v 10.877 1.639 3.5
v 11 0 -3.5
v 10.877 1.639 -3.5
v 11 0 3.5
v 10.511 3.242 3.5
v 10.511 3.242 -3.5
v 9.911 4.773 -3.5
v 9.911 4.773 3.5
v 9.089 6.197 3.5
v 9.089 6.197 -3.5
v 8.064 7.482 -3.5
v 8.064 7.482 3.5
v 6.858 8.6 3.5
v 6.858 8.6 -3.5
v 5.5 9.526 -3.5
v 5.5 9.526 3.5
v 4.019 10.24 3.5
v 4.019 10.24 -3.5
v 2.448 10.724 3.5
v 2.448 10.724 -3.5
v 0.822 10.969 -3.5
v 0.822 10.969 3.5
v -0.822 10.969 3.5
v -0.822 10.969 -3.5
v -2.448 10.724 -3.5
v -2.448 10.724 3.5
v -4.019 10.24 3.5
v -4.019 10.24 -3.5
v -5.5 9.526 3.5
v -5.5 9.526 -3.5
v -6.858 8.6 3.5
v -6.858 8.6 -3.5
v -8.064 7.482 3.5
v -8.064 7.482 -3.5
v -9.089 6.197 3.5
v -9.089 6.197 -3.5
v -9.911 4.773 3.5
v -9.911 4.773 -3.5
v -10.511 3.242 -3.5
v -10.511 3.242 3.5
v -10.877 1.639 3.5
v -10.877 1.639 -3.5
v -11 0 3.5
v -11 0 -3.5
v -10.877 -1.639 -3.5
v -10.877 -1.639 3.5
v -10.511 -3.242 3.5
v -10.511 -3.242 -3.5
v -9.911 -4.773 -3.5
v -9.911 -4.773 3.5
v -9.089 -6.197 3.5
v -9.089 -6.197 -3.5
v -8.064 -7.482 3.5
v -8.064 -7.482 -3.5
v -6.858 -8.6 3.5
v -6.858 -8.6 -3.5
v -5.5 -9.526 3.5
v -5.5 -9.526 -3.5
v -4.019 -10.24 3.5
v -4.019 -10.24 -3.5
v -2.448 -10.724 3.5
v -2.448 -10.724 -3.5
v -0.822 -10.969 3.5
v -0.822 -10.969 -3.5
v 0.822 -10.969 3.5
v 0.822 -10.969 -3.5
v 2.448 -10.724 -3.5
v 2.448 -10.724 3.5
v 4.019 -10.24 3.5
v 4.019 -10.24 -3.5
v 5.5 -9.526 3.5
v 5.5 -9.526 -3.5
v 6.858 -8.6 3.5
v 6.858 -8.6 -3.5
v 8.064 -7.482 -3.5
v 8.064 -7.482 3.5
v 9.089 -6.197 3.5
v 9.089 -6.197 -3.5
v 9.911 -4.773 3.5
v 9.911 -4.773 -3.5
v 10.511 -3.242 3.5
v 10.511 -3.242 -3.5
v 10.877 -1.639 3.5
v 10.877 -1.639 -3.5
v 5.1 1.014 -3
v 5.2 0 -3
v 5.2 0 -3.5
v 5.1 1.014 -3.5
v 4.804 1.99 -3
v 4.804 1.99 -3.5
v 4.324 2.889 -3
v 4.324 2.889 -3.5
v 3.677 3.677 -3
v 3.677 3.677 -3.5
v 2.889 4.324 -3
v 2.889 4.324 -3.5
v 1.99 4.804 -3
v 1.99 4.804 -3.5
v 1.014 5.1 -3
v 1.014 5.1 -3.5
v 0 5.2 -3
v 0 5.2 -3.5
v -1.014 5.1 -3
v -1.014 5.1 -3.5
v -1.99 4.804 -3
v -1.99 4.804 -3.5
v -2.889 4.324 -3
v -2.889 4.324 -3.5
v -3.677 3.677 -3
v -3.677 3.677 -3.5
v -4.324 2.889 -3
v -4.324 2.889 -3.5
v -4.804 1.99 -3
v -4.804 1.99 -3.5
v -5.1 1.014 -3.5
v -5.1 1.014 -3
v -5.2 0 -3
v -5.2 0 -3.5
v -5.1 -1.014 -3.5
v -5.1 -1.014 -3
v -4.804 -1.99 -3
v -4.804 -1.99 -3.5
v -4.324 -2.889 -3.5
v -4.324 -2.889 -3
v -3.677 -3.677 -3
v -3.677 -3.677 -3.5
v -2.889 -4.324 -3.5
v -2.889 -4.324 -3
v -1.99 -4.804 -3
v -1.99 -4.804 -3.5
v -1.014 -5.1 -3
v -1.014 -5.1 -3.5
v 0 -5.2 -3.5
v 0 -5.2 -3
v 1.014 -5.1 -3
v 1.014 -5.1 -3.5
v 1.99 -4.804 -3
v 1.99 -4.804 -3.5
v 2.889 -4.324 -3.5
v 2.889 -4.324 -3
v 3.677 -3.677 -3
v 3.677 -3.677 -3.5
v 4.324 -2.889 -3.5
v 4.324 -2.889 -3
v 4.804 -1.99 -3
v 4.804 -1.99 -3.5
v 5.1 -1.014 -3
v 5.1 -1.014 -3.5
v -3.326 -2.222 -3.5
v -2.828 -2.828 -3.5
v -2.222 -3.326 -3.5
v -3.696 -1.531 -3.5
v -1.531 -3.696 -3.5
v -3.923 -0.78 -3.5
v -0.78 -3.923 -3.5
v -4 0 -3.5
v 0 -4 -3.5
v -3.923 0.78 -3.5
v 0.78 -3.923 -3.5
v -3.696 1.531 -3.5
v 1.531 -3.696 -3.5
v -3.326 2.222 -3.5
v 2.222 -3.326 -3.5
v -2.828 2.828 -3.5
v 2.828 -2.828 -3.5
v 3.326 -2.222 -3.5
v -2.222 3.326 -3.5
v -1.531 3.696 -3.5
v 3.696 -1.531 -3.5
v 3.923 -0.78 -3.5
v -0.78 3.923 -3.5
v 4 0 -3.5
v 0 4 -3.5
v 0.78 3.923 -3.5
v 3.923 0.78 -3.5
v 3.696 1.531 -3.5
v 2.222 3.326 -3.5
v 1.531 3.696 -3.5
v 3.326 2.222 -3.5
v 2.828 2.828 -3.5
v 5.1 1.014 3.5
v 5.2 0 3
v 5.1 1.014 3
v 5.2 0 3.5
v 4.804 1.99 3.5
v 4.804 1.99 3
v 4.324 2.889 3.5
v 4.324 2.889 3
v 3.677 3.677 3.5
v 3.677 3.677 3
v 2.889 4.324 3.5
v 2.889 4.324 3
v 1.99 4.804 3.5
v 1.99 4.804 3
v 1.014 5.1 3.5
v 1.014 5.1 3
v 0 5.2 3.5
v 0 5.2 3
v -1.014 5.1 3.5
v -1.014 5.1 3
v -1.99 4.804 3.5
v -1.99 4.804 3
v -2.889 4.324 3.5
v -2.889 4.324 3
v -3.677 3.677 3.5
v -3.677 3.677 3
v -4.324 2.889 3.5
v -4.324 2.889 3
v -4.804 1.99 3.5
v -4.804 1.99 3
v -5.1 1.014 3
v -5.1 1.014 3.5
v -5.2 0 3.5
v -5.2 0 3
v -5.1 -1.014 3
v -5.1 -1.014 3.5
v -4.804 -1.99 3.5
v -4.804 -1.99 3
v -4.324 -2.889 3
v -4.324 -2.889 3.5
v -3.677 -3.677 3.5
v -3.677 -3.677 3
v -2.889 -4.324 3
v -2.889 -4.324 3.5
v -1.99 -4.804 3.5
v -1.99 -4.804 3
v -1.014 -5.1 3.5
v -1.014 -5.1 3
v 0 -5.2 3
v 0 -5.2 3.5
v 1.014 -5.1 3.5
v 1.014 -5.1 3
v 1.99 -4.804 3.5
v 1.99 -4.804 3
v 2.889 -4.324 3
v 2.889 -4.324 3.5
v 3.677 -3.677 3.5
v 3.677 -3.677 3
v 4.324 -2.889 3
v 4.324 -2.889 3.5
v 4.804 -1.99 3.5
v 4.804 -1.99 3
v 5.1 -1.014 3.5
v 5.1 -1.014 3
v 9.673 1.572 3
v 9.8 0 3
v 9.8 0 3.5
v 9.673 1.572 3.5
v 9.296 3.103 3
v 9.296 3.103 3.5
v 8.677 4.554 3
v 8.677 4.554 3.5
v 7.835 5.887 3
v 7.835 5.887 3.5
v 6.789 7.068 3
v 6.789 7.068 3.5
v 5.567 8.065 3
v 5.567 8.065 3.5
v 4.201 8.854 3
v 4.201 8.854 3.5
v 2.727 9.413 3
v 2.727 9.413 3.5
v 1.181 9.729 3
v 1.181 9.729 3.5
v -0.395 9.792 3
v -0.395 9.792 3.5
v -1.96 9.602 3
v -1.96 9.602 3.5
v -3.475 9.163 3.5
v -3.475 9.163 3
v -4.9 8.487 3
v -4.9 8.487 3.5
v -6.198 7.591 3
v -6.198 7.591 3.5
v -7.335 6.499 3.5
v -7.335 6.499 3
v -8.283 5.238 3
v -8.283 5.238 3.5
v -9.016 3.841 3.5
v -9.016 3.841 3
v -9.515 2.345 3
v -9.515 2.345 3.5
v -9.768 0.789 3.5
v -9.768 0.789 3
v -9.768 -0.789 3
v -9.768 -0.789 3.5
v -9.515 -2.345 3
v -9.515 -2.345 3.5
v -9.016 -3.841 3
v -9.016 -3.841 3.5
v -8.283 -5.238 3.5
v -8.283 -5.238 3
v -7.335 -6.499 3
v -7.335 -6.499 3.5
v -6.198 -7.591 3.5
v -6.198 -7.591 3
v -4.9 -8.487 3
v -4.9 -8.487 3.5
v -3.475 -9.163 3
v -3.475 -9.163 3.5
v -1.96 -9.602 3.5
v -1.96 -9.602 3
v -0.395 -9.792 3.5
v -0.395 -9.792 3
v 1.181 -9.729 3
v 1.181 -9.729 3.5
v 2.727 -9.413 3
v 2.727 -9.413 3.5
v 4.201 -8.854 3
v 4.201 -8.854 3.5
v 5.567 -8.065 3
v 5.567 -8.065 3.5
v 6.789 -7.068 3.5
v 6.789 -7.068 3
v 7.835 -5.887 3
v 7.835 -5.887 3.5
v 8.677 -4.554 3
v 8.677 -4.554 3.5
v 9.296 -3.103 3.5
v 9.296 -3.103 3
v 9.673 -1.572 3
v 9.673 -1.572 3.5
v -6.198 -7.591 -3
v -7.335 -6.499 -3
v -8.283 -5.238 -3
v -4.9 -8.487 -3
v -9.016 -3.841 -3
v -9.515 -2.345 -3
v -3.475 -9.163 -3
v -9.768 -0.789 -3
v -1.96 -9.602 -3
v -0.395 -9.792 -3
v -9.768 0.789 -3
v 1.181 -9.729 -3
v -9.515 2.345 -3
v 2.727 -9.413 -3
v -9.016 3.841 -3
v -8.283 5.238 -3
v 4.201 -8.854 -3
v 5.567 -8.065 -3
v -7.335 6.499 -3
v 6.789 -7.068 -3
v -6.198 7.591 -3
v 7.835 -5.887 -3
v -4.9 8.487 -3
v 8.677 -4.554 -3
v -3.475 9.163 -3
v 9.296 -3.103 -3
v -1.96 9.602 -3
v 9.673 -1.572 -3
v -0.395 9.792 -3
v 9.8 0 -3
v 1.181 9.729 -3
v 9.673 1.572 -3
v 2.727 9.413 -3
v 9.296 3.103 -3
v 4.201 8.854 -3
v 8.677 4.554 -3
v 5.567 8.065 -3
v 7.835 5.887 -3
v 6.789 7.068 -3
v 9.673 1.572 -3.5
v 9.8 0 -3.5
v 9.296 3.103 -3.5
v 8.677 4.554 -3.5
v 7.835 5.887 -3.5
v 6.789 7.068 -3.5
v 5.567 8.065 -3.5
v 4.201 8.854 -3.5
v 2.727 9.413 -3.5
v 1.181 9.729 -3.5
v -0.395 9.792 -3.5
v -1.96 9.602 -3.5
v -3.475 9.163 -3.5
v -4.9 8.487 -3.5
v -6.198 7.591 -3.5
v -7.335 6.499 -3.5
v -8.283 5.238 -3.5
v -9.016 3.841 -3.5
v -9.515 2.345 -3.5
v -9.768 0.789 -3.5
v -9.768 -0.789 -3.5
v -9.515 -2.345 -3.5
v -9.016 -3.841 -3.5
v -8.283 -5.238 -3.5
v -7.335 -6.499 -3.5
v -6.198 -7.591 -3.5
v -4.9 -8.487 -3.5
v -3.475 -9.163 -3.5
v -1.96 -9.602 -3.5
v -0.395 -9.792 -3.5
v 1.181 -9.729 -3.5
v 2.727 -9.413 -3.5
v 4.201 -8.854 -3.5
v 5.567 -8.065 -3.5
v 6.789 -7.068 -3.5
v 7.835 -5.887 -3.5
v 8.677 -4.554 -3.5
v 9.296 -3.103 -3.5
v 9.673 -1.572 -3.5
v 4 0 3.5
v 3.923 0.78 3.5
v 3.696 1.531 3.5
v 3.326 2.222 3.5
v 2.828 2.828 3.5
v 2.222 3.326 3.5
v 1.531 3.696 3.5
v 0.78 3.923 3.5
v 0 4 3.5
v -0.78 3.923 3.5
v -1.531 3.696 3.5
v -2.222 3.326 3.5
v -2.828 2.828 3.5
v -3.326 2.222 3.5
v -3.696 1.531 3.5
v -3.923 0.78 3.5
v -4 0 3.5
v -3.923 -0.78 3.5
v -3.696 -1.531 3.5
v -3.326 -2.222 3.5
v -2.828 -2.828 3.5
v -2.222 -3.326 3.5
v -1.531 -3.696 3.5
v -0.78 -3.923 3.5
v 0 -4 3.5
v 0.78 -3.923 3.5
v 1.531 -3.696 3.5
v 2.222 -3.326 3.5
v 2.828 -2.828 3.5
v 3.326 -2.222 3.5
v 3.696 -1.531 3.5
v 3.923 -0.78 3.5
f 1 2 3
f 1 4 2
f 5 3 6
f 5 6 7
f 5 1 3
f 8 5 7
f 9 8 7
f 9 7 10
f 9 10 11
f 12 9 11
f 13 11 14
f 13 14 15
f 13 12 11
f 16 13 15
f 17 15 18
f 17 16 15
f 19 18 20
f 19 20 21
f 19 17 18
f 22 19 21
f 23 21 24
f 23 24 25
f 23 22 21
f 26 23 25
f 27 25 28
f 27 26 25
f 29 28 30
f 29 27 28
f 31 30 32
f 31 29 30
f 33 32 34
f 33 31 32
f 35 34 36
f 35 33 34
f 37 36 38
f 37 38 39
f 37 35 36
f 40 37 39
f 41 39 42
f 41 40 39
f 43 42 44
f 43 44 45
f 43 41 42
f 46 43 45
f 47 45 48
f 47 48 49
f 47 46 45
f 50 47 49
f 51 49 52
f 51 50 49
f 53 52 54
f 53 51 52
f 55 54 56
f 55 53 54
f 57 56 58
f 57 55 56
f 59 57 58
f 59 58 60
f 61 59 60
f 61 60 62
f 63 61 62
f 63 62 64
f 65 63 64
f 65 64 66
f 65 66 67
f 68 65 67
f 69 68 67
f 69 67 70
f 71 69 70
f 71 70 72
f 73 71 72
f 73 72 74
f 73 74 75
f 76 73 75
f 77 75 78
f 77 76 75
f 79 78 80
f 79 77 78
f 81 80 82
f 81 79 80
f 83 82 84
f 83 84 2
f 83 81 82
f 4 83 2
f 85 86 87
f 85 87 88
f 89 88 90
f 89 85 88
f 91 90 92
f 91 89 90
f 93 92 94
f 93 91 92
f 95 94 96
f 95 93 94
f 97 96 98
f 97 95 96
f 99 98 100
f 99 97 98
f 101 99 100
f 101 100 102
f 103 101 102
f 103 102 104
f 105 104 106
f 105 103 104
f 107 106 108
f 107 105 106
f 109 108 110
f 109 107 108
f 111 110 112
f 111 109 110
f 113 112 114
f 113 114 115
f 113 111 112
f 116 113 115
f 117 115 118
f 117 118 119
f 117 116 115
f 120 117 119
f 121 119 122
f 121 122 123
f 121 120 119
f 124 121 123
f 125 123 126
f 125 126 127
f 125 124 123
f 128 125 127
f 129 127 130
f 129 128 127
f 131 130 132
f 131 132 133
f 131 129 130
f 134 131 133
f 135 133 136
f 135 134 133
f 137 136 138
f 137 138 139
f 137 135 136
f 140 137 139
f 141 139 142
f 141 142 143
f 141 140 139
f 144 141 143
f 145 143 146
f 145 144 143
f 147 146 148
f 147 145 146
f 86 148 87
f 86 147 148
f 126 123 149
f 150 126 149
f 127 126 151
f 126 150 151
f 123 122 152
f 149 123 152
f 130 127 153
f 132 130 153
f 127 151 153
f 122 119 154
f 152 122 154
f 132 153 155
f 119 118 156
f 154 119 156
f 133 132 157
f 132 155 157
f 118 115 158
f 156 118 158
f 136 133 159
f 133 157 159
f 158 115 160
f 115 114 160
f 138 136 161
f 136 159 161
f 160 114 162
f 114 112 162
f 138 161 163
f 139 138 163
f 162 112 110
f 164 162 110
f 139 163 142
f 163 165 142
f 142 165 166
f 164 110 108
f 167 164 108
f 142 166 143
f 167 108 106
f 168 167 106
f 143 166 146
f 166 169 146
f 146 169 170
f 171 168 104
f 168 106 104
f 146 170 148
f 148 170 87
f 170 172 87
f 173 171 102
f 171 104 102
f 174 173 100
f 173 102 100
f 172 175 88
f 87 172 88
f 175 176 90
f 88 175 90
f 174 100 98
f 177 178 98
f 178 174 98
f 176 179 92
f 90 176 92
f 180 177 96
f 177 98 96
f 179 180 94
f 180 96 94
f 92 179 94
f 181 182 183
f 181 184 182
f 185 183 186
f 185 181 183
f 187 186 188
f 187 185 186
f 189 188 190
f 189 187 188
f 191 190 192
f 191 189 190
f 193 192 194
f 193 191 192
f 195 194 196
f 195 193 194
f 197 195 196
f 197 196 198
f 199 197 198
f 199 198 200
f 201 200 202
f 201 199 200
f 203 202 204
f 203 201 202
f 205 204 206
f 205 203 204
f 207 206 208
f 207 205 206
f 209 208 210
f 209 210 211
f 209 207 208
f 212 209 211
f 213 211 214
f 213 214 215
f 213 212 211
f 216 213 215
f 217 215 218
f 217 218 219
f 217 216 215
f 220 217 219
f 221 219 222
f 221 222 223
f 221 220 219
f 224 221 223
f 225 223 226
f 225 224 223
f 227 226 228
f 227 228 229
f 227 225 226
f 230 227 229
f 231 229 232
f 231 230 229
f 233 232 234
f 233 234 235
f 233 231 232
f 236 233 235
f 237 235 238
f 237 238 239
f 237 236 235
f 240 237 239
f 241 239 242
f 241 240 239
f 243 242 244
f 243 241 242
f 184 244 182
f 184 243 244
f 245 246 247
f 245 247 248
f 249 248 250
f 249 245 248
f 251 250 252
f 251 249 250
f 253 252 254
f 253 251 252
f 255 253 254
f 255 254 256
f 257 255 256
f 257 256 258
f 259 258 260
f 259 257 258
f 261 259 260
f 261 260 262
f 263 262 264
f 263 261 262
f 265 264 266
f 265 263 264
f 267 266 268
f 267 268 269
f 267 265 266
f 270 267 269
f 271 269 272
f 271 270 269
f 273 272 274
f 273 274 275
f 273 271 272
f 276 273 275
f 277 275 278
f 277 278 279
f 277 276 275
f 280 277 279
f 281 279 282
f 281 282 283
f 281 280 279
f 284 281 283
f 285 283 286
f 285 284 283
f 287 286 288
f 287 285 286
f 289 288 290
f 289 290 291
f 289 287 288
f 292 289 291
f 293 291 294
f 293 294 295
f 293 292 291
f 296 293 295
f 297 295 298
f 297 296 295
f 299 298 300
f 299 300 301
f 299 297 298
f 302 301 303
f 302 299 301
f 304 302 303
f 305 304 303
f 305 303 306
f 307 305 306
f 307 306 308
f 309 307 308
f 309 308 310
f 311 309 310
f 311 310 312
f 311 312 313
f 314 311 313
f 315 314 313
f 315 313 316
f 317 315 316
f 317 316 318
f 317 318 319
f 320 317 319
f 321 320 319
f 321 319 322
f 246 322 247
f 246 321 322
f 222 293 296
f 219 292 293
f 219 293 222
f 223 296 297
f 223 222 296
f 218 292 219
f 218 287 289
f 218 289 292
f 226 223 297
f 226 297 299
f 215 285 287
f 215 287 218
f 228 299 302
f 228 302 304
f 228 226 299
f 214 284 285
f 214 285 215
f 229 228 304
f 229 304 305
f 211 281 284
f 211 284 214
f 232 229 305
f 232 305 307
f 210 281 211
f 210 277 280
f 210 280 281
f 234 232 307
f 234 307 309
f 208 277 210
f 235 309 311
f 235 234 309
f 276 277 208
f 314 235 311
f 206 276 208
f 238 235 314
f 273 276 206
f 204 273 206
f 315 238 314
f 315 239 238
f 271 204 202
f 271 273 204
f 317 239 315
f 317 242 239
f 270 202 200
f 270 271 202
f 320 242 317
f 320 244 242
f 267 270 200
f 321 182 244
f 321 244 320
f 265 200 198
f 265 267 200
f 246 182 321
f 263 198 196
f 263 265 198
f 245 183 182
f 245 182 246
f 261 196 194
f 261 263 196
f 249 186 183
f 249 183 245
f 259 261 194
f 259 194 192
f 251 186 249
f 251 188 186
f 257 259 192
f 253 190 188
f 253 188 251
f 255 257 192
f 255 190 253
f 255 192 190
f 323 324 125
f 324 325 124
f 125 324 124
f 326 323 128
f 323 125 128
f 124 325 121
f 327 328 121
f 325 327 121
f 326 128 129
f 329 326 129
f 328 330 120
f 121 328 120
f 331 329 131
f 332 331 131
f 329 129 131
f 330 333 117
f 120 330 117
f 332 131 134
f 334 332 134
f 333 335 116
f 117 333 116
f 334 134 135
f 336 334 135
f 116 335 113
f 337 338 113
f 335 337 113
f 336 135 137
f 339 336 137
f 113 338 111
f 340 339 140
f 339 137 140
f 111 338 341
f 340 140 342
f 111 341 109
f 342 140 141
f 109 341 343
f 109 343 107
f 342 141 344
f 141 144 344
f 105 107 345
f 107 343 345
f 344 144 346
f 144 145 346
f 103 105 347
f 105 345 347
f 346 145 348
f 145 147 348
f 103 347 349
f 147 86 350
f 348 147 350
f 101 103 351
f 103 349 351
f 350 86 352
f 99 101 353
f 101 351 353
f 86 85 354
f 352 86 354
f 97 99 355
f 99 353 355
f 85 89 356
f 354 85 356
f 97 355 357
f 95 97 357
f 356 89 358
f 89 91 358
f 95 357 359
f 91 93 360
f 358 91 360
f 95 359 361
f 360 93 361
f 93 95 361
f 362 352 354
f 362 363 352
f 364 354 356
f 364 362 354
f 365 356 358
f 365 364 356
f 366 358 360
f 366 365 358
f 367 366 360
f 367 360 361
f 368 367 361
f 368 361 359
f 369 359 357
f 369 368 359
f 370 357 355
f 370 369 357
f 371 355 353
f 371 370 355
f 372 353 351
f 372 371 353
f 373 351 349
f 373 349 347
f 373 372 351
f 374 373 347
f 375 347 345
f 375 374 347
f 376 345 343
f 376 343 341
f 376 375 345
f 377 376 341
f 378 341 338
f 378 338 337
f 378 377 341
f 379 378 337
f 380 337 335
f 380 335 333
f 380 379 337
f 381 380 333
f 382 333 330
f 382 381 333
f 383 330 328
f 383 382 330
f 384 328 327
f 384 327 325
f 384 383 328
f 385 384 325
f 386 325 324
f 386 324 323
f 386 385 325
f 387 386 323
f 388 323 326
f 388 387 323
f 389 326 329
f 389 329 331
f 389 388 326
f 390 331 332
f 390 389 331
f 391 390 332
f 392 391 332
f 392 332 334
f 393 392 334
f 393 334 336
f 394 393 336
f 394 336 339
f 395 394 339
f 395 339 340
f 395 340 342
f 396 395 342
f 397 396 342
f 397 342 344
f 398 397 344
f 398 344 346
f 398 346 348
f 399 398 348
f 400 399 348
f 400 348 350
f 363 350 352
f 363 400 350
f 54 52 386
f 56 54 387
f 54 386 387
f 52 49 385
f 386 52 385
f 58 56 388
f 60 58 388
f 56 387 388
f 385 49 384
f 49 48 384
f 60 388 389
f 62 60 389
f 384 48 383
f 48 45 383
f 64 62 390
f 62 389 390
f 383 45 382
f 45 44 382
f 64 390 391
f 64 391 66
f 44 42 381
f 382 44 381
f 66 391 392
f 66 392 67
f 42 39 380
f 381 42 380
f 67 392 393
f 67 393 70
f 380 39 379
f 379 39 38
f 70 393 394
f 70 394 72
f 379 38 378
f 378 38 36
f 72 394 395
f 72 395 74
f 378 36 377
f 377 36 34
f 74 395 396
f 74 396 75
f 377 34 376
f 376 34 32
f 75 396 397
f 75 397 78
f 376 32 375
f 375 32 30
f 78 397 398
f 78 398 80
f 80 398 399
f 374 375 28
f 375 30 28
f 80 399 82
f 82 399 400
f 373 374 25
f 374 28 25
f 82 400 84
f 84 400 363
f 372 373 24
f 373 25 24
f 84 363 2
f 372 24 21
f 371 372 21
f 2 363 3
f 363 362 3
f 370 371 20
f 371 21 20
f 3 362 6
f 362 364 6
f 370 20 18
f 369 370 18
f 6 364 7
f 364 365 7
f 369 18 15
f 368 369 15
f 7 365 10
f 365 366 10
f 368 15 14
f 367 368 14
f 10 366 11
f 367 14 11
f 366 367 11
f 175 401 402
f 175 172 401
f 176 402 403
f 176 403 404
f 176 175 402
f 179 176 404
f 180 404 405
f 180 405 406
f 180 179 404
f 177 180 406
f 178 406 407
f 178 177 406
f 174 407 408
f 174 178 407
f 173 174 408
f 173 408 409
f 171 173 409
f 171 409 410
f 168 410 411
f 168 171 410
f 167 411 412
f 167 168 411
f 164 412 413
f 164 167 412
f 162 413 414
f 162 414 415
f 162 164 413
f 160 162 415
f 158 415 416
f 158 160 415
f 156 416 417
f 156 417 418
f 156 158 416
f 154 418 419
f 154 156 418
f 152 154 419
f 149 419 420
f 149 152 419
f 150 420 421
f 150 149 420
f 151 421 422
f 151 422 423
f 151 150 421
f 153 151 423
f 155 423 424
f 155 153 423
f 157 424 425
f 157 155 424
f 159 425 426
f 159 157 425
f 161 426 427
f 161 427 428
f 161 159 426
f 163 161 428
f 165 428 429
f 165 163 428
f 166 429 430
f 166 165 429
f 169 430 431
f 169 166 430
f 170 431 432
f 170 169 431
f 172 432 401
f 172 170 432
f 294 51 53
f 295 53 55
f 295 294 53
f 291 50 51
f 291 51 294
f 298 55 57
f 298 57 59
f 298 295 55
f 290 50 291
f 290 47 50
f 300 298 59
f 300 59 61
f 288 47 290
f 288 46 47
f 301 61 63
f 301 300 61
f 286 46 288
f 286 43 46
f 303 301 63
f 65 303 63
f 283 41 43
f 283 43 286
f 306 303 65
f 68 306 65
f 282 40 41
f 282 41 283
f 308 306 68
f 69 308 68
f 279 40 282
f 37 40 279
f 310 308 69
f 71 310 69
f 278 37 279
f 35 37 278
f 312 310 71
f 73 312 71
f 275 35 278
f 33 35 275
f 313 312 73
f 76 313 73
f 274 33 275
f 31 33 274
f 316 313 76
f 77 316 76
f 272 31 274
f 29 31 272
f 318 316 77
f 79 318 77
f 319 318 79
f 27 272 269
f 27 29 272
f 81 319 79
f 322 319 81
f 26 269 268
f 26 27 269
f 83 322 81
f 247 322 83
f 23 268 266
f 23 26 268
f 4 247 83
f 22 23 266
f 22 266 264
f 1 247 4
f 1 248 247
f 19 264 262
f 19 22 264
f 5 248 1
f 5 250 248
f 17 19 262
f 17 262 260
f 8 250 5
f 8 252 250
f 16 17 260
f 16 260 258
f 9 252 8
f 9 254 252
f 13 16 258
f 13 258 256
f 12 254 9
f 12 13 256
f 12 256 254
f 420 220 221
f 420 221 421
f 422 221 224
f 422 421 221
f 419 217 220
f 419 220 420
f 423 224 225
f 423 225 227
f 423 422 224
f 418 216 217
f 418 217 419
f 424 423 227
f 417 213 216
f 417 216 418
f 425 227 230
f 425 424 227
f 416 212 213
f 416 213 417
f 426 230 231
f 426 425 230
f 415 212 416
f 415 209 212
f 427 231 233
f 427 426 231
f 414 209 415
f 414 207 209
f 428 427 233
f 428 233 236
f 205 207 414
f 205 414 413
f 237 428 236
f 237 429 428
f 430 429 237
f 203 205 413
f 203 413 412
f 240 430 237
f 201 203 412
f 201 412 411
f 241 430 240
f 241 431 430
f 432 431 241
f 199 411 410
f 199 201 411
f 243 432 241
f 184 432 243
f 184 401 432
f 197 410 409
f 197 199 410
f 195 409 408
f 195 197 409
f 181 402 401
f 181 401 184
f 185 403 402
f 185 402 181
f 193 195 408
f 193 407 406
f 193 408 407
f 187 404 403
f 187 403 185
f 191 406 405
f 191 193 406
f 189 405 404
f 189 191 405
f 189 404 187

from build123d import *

# Parameters (mm, degrees)
F1_R     = 11
F1_R_2   = 9.8
F2_DEPTH = 3.5
F1_R_3   = 5.2
F1_R_4   = 4
F3_DEPTH = 3


with BuildPart() as f2:
    # F1 (on Top) → F2 (new body, symmetric)
    with BuildSketch(Plane.XY):
        Circle(F1_R)
        Circle(F1_R_2, mode=Mode.SUBTRACT)
    extrude(amount=F2_DEPTH, both=True)



with BuildPart() as f2b:
    # F1 (on Top) → F2, piece 2 (new body, symmetric)
    with BuildSketch(Plane.XY):
        Circle(F1_R_3)
        Circle(F1_R_4, mode=Mode.SUBTRACT)
    extrude(amount=F2_DEPTH, both=True)


with BuildPart() as f2_1:
    add(f2.part)

    add(f2b.part)  # F3 merges F2b
    # F1 (on Top) → F3 (join, symmetric)
    with BuildSketch(Plane.XY):
        Circle(F1_R_2)
        Circle(F1_R_3, mode=Mode.SUBTRACT)
    extrude(amount=F3_DEPTH, both=True)


solid = f2_1.part
